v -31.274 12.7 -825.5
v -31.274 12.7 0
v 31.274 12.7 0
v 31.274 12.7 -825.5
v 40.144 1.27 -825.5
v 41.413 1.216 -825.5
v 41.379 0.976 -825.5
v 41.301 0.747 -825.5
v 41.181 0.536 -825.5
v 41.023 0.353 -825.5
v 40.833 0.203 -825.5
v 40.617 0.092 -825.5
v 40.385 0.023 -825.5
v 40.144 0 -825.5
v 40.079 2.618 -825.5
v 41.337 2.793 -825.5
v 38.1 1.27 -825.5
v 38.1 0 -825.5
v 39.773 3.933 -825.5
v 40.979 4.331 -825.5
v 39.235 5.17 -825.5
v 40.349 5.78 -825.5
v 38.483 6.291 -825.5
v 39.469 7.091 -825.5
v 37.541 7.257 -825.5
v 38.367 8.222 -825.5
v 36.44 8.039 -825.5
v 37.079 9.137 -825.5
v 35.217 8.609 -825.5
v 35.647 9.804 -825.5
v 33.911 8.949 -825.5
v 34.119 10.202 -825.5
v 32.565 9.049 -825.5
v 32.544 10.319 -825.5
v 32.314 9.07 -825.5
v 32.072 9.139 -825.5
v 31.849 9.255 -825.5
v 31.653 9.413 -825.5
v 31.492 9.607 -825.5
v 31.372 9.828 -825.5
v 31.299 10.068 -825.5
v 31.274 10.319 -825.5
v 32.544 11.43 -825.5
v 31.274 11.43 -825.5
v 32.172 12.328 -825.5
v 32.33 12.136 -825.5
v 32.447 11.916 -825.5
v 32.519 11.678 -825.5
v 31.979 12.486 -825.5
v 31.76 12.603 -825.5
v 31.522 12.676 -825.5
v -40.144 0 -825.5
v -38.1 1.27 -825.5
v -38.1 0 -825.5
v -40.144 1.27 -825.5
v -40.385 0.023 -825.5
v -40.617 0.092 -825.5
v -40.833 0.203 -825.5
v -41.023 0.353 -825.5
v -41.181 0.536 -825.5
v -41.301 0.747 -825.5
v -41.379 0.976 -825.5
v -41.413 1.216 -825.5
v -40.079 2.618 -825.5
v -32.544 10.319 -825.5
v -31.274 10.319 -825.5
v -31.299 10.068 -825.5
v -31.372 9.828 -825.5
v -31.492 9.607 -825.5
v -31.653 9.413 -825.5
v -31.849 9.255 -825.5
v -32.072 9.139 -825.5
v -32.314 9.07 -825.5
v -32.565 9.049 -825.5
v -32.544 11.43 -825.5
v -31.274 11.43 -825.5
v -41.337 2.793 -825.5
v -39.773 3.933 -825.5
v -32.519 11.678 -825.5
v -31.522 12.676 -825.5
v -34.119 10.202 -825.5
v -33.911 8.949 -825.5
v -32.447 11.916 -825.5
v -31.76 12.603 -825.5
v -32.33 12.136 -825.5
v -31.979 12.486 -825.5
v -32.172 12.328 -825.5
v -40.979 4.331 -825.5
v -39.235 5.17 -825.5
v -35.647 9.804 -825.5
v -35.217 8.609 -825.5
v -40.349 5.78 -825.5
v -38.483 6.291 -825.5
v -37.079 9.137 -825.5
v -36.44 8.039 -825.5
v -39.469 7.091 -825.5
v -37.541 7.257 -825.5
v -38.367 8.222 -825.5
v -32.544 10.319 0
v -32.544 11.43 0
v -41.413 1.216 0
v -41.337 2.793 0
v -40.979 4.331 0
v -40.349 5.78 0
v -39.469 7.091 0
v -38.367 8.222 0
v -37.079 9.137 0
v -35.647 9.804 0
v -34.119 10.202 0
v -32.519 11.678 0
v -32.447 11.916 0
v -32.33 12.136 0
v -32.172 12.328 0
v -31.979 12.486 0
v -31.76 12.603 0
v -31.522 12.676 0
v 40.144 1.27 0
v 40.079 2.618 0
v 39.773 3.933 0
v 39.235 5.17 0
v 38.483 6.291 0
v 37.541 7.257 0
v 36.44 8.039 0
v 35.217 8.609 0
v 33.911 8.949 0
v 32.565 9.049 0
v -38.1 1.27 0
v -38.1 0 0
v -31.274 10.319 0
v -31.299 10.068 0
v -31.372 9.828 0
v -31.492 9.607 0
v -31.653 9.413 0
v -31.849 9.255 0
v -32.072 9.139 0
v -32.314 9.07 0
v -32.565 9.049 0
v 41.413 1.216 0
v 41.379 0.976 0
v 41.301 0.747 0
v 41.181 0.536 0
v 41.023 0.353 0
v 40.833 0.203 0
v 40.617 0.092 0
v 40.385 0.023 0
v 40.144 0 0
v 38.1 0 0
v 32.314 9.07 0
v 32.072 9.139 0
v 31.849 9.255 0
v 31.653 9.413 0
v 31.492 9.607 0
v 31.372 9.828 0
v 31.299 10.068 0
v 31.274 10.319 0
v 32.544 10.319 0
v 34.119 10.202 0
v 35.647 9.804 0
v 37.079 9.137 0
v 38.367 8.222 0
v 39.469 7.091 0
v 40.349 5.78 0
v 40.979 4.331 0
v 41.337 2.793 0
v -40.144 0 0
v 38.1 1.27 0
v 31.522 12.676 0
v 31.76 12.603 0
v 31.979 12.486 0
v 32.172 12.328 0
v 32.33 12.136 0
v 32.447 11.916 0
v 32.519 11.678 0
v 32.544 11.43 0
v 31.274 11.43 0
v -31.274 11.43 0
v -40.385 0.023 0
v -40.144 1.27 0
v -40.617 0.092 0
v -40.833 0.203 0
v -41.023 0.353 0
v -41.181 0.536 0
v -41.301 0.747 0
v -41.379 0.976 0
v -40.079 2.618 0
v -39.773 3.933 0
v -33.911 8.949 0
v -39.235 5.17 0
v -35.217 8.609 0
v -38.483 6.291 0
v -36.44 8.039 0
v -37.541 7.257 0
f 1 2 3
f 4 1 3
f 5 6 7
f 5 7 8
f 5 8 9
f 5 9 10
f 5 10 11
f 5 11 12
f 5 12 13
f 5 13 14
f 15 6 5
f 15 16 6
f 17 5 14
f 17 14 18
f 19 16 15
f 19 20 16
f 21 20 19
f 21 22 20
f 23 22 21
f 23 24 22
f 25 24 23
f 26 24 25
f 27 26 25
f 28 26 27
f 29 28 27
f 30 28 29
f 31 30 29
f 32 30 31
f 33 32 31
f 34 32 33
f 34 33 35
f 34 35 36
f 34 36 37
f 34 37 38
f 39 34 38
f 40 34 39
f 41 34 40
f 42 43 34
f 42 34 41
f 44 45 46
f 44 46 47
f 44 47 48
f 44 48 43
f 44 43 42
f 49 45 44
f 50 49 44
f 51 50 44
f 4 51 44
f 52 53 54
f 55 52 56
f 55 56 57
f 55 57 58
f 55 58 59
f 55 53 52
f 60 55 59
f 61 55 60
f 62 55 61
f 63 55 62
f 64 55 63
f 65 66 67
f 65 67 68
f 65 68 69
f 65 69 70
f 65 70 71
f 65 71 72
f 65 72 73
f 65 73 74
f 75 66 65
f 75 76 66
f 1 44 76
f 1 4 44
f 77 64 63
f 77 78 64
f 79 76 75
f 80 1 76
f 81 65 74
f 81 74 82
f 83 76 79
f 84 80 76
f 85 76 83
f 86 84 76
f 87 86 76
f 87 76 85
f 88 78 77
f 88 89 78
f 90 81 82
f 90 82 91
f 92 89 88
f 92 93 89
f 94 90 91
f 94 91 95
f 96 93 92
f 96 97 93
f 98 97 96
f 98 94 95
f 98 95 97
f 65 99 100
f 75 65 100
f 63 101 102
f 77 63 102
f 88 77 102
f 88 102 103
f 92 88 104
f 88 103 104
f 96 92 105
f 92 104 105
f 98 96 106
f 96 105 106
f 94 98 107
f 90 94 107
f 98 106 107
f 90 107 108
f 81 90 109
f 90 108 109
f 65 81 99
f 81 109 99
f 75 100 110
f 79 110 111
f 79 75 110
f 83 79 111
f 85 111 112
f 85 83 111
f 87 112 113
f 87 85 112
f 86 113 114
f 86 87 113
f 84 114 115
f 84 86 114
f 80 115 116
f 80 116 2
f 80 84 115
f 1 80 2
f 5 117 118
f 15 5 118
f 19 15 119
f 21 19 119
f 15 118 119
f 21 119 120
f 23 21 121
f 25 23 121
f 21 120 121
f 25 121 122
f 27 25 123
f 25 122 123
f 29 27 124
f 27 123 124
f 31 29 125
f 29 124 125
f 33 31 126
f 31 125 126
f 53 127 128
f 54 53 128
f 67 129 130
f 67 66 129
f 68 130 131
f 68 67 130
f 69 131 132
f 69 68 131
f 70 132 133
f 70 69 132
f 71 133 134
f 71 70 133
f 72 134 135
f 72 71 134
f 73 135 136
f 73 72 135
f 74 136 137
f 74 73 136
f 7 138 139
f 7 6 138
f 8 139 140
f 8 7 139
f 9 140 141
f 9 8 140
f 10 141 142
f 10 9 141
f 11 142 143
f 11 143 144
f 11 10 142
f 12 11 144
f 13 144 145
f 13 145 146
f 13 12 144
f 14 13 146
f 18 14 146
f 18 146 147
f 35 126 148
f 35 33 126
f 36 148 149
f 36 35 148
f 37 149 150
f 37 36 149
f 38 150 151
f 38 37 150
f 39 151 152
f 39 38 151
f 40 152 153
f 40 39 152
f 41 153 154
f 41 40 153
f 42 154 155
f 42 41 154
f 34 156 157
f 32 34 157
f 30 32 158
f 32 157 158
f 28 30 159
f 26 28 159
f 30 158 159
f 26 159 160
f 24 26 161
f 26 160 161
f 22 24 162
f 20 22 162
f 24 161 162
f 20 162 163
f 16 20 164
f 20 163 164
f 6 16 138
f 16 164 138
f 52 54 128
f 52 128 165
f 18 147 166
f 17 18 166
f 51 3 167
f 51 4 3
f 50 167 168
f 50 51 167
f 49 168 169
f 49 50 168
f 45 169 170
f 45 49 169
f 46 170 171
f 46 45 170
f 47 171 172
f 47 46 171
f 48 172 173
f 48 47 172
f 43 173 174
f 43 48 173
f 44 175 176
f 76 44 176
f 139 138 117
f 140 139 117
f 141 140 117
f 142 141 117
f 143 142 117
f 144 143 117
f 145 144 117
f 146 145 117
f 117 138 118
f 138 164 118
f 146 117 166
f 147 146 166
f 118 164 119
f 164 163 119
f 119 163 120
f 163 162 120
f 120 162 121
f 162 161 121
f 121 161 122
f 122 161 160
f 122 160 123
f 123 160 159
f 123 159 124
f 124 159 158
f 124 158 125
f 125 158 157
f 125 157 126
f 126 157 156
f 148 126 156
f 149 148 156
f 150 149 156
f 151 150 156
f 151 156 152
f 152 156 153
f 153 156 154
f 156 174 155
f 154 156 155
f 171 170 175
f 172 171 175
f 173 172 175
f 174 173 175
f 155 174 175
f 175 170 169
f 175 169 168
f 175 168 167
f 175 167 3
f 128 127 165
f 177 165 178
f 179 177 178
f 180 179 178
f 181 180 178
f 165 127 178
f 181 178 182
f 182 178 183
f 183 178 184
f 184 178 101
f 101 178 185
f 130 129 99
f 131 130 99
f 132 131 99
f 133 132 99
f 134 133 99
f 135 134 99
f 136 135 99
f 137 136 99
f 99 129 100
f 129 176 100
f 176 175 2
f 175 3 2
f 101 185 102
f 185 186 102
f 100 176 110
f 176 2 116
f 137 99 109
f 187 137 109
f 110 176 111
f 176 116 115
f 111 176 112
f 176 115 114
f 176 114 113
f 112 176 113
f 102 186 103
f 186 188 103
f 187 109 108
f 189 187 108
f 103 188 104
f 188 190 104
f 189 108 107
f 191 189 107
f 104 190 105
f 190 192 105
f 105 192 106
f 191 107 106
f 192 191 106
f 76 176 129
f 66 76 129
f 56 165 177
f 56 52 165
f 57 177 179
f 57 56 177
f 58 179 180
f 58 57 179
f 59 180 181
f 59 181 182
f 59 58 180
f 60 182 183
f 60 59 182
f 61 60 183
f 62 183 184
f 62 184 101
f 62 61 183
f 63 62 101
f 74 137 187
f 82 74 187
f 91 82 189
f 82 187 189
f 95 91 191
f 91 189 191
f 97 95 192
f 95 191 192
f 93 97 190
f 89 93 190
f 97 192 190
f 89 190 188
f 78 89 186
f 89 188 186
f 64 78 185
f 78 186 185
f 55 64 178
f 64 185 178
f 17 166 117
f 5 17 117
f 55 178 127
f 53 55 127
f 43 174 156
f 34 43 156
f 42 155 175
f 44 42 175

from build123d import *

# Parameters (mm, degrees)
EXTRUDE_THIN1_DEPTH = 825.5
FILLET1_R           = 1.27


with BuildPart() as part:
    # Sketch1 → Extrude-Thin1 (new body)
    with BuildSketch(Plane.XY):
        with BuildLine():
            Line((-38.1, 0), (-41.275, 0))
            ThreePointArc((-41.275, 0), (-39.354822583, 7.228599878), (-32.54375, 10.31875))
            Line((-32.54375, 10.31875), (-32.54375, 12.7))
            Line((-32.54375, 12.7), (32.54375, 12.7))
            Line((32.54375, 12.7), (32.54375, 10.31875))
            ThreePointArc((32.54375, 10.31875), (39.354822583, 7.228599878), (41.275, 0))
            Line((41.275, 0), (38.1, 0))
            Line((38.1, 0), (38.1, 1.27))
            Line((38.1, 1.27), (40.143945779, 1.27))
            ThreePointArc((40.143945779, 1.27), (37.560409803, 7.240667538), (31.27375, 8.914417078))
            Line((31.27375, 8.914417078), (31.27375, 11.43))
            Line((31.27375, 11.43), (-31.27375, 11.43))
            Line((-31.27375, 11.43), (-31.27375, 8.914417078))
            ThreePointArc((-31.27375, 8.914417078), (-37.560409803, 7.240667538), (-40.143945779, 1.27))
            Line((-40.143945779, 1.27), (-38.1, 1.27))
            Line((-38.1, 1.27), (-38.1, 0))
        make_face()
    extrude(amount=-EXTRUDE_THIN1_DEPTH)

    # Fillet1
    fillet1_edges = [part.edges().sort_by_distance(p)[0] for p in [
        (-41.275, 0, -412.75),
        (-32.54375, 12.7, -412.75),
        (32.54375, 12.7, -412.75),
        (41.275, 0, -412.75),
        (31.27375, 8.914417078, -412.75),
        (-31.27375, 8.914417078, -412.75),
    ]]
    fillet(fillet1_edges, radius=FILLET1_R)


solid = part.part
